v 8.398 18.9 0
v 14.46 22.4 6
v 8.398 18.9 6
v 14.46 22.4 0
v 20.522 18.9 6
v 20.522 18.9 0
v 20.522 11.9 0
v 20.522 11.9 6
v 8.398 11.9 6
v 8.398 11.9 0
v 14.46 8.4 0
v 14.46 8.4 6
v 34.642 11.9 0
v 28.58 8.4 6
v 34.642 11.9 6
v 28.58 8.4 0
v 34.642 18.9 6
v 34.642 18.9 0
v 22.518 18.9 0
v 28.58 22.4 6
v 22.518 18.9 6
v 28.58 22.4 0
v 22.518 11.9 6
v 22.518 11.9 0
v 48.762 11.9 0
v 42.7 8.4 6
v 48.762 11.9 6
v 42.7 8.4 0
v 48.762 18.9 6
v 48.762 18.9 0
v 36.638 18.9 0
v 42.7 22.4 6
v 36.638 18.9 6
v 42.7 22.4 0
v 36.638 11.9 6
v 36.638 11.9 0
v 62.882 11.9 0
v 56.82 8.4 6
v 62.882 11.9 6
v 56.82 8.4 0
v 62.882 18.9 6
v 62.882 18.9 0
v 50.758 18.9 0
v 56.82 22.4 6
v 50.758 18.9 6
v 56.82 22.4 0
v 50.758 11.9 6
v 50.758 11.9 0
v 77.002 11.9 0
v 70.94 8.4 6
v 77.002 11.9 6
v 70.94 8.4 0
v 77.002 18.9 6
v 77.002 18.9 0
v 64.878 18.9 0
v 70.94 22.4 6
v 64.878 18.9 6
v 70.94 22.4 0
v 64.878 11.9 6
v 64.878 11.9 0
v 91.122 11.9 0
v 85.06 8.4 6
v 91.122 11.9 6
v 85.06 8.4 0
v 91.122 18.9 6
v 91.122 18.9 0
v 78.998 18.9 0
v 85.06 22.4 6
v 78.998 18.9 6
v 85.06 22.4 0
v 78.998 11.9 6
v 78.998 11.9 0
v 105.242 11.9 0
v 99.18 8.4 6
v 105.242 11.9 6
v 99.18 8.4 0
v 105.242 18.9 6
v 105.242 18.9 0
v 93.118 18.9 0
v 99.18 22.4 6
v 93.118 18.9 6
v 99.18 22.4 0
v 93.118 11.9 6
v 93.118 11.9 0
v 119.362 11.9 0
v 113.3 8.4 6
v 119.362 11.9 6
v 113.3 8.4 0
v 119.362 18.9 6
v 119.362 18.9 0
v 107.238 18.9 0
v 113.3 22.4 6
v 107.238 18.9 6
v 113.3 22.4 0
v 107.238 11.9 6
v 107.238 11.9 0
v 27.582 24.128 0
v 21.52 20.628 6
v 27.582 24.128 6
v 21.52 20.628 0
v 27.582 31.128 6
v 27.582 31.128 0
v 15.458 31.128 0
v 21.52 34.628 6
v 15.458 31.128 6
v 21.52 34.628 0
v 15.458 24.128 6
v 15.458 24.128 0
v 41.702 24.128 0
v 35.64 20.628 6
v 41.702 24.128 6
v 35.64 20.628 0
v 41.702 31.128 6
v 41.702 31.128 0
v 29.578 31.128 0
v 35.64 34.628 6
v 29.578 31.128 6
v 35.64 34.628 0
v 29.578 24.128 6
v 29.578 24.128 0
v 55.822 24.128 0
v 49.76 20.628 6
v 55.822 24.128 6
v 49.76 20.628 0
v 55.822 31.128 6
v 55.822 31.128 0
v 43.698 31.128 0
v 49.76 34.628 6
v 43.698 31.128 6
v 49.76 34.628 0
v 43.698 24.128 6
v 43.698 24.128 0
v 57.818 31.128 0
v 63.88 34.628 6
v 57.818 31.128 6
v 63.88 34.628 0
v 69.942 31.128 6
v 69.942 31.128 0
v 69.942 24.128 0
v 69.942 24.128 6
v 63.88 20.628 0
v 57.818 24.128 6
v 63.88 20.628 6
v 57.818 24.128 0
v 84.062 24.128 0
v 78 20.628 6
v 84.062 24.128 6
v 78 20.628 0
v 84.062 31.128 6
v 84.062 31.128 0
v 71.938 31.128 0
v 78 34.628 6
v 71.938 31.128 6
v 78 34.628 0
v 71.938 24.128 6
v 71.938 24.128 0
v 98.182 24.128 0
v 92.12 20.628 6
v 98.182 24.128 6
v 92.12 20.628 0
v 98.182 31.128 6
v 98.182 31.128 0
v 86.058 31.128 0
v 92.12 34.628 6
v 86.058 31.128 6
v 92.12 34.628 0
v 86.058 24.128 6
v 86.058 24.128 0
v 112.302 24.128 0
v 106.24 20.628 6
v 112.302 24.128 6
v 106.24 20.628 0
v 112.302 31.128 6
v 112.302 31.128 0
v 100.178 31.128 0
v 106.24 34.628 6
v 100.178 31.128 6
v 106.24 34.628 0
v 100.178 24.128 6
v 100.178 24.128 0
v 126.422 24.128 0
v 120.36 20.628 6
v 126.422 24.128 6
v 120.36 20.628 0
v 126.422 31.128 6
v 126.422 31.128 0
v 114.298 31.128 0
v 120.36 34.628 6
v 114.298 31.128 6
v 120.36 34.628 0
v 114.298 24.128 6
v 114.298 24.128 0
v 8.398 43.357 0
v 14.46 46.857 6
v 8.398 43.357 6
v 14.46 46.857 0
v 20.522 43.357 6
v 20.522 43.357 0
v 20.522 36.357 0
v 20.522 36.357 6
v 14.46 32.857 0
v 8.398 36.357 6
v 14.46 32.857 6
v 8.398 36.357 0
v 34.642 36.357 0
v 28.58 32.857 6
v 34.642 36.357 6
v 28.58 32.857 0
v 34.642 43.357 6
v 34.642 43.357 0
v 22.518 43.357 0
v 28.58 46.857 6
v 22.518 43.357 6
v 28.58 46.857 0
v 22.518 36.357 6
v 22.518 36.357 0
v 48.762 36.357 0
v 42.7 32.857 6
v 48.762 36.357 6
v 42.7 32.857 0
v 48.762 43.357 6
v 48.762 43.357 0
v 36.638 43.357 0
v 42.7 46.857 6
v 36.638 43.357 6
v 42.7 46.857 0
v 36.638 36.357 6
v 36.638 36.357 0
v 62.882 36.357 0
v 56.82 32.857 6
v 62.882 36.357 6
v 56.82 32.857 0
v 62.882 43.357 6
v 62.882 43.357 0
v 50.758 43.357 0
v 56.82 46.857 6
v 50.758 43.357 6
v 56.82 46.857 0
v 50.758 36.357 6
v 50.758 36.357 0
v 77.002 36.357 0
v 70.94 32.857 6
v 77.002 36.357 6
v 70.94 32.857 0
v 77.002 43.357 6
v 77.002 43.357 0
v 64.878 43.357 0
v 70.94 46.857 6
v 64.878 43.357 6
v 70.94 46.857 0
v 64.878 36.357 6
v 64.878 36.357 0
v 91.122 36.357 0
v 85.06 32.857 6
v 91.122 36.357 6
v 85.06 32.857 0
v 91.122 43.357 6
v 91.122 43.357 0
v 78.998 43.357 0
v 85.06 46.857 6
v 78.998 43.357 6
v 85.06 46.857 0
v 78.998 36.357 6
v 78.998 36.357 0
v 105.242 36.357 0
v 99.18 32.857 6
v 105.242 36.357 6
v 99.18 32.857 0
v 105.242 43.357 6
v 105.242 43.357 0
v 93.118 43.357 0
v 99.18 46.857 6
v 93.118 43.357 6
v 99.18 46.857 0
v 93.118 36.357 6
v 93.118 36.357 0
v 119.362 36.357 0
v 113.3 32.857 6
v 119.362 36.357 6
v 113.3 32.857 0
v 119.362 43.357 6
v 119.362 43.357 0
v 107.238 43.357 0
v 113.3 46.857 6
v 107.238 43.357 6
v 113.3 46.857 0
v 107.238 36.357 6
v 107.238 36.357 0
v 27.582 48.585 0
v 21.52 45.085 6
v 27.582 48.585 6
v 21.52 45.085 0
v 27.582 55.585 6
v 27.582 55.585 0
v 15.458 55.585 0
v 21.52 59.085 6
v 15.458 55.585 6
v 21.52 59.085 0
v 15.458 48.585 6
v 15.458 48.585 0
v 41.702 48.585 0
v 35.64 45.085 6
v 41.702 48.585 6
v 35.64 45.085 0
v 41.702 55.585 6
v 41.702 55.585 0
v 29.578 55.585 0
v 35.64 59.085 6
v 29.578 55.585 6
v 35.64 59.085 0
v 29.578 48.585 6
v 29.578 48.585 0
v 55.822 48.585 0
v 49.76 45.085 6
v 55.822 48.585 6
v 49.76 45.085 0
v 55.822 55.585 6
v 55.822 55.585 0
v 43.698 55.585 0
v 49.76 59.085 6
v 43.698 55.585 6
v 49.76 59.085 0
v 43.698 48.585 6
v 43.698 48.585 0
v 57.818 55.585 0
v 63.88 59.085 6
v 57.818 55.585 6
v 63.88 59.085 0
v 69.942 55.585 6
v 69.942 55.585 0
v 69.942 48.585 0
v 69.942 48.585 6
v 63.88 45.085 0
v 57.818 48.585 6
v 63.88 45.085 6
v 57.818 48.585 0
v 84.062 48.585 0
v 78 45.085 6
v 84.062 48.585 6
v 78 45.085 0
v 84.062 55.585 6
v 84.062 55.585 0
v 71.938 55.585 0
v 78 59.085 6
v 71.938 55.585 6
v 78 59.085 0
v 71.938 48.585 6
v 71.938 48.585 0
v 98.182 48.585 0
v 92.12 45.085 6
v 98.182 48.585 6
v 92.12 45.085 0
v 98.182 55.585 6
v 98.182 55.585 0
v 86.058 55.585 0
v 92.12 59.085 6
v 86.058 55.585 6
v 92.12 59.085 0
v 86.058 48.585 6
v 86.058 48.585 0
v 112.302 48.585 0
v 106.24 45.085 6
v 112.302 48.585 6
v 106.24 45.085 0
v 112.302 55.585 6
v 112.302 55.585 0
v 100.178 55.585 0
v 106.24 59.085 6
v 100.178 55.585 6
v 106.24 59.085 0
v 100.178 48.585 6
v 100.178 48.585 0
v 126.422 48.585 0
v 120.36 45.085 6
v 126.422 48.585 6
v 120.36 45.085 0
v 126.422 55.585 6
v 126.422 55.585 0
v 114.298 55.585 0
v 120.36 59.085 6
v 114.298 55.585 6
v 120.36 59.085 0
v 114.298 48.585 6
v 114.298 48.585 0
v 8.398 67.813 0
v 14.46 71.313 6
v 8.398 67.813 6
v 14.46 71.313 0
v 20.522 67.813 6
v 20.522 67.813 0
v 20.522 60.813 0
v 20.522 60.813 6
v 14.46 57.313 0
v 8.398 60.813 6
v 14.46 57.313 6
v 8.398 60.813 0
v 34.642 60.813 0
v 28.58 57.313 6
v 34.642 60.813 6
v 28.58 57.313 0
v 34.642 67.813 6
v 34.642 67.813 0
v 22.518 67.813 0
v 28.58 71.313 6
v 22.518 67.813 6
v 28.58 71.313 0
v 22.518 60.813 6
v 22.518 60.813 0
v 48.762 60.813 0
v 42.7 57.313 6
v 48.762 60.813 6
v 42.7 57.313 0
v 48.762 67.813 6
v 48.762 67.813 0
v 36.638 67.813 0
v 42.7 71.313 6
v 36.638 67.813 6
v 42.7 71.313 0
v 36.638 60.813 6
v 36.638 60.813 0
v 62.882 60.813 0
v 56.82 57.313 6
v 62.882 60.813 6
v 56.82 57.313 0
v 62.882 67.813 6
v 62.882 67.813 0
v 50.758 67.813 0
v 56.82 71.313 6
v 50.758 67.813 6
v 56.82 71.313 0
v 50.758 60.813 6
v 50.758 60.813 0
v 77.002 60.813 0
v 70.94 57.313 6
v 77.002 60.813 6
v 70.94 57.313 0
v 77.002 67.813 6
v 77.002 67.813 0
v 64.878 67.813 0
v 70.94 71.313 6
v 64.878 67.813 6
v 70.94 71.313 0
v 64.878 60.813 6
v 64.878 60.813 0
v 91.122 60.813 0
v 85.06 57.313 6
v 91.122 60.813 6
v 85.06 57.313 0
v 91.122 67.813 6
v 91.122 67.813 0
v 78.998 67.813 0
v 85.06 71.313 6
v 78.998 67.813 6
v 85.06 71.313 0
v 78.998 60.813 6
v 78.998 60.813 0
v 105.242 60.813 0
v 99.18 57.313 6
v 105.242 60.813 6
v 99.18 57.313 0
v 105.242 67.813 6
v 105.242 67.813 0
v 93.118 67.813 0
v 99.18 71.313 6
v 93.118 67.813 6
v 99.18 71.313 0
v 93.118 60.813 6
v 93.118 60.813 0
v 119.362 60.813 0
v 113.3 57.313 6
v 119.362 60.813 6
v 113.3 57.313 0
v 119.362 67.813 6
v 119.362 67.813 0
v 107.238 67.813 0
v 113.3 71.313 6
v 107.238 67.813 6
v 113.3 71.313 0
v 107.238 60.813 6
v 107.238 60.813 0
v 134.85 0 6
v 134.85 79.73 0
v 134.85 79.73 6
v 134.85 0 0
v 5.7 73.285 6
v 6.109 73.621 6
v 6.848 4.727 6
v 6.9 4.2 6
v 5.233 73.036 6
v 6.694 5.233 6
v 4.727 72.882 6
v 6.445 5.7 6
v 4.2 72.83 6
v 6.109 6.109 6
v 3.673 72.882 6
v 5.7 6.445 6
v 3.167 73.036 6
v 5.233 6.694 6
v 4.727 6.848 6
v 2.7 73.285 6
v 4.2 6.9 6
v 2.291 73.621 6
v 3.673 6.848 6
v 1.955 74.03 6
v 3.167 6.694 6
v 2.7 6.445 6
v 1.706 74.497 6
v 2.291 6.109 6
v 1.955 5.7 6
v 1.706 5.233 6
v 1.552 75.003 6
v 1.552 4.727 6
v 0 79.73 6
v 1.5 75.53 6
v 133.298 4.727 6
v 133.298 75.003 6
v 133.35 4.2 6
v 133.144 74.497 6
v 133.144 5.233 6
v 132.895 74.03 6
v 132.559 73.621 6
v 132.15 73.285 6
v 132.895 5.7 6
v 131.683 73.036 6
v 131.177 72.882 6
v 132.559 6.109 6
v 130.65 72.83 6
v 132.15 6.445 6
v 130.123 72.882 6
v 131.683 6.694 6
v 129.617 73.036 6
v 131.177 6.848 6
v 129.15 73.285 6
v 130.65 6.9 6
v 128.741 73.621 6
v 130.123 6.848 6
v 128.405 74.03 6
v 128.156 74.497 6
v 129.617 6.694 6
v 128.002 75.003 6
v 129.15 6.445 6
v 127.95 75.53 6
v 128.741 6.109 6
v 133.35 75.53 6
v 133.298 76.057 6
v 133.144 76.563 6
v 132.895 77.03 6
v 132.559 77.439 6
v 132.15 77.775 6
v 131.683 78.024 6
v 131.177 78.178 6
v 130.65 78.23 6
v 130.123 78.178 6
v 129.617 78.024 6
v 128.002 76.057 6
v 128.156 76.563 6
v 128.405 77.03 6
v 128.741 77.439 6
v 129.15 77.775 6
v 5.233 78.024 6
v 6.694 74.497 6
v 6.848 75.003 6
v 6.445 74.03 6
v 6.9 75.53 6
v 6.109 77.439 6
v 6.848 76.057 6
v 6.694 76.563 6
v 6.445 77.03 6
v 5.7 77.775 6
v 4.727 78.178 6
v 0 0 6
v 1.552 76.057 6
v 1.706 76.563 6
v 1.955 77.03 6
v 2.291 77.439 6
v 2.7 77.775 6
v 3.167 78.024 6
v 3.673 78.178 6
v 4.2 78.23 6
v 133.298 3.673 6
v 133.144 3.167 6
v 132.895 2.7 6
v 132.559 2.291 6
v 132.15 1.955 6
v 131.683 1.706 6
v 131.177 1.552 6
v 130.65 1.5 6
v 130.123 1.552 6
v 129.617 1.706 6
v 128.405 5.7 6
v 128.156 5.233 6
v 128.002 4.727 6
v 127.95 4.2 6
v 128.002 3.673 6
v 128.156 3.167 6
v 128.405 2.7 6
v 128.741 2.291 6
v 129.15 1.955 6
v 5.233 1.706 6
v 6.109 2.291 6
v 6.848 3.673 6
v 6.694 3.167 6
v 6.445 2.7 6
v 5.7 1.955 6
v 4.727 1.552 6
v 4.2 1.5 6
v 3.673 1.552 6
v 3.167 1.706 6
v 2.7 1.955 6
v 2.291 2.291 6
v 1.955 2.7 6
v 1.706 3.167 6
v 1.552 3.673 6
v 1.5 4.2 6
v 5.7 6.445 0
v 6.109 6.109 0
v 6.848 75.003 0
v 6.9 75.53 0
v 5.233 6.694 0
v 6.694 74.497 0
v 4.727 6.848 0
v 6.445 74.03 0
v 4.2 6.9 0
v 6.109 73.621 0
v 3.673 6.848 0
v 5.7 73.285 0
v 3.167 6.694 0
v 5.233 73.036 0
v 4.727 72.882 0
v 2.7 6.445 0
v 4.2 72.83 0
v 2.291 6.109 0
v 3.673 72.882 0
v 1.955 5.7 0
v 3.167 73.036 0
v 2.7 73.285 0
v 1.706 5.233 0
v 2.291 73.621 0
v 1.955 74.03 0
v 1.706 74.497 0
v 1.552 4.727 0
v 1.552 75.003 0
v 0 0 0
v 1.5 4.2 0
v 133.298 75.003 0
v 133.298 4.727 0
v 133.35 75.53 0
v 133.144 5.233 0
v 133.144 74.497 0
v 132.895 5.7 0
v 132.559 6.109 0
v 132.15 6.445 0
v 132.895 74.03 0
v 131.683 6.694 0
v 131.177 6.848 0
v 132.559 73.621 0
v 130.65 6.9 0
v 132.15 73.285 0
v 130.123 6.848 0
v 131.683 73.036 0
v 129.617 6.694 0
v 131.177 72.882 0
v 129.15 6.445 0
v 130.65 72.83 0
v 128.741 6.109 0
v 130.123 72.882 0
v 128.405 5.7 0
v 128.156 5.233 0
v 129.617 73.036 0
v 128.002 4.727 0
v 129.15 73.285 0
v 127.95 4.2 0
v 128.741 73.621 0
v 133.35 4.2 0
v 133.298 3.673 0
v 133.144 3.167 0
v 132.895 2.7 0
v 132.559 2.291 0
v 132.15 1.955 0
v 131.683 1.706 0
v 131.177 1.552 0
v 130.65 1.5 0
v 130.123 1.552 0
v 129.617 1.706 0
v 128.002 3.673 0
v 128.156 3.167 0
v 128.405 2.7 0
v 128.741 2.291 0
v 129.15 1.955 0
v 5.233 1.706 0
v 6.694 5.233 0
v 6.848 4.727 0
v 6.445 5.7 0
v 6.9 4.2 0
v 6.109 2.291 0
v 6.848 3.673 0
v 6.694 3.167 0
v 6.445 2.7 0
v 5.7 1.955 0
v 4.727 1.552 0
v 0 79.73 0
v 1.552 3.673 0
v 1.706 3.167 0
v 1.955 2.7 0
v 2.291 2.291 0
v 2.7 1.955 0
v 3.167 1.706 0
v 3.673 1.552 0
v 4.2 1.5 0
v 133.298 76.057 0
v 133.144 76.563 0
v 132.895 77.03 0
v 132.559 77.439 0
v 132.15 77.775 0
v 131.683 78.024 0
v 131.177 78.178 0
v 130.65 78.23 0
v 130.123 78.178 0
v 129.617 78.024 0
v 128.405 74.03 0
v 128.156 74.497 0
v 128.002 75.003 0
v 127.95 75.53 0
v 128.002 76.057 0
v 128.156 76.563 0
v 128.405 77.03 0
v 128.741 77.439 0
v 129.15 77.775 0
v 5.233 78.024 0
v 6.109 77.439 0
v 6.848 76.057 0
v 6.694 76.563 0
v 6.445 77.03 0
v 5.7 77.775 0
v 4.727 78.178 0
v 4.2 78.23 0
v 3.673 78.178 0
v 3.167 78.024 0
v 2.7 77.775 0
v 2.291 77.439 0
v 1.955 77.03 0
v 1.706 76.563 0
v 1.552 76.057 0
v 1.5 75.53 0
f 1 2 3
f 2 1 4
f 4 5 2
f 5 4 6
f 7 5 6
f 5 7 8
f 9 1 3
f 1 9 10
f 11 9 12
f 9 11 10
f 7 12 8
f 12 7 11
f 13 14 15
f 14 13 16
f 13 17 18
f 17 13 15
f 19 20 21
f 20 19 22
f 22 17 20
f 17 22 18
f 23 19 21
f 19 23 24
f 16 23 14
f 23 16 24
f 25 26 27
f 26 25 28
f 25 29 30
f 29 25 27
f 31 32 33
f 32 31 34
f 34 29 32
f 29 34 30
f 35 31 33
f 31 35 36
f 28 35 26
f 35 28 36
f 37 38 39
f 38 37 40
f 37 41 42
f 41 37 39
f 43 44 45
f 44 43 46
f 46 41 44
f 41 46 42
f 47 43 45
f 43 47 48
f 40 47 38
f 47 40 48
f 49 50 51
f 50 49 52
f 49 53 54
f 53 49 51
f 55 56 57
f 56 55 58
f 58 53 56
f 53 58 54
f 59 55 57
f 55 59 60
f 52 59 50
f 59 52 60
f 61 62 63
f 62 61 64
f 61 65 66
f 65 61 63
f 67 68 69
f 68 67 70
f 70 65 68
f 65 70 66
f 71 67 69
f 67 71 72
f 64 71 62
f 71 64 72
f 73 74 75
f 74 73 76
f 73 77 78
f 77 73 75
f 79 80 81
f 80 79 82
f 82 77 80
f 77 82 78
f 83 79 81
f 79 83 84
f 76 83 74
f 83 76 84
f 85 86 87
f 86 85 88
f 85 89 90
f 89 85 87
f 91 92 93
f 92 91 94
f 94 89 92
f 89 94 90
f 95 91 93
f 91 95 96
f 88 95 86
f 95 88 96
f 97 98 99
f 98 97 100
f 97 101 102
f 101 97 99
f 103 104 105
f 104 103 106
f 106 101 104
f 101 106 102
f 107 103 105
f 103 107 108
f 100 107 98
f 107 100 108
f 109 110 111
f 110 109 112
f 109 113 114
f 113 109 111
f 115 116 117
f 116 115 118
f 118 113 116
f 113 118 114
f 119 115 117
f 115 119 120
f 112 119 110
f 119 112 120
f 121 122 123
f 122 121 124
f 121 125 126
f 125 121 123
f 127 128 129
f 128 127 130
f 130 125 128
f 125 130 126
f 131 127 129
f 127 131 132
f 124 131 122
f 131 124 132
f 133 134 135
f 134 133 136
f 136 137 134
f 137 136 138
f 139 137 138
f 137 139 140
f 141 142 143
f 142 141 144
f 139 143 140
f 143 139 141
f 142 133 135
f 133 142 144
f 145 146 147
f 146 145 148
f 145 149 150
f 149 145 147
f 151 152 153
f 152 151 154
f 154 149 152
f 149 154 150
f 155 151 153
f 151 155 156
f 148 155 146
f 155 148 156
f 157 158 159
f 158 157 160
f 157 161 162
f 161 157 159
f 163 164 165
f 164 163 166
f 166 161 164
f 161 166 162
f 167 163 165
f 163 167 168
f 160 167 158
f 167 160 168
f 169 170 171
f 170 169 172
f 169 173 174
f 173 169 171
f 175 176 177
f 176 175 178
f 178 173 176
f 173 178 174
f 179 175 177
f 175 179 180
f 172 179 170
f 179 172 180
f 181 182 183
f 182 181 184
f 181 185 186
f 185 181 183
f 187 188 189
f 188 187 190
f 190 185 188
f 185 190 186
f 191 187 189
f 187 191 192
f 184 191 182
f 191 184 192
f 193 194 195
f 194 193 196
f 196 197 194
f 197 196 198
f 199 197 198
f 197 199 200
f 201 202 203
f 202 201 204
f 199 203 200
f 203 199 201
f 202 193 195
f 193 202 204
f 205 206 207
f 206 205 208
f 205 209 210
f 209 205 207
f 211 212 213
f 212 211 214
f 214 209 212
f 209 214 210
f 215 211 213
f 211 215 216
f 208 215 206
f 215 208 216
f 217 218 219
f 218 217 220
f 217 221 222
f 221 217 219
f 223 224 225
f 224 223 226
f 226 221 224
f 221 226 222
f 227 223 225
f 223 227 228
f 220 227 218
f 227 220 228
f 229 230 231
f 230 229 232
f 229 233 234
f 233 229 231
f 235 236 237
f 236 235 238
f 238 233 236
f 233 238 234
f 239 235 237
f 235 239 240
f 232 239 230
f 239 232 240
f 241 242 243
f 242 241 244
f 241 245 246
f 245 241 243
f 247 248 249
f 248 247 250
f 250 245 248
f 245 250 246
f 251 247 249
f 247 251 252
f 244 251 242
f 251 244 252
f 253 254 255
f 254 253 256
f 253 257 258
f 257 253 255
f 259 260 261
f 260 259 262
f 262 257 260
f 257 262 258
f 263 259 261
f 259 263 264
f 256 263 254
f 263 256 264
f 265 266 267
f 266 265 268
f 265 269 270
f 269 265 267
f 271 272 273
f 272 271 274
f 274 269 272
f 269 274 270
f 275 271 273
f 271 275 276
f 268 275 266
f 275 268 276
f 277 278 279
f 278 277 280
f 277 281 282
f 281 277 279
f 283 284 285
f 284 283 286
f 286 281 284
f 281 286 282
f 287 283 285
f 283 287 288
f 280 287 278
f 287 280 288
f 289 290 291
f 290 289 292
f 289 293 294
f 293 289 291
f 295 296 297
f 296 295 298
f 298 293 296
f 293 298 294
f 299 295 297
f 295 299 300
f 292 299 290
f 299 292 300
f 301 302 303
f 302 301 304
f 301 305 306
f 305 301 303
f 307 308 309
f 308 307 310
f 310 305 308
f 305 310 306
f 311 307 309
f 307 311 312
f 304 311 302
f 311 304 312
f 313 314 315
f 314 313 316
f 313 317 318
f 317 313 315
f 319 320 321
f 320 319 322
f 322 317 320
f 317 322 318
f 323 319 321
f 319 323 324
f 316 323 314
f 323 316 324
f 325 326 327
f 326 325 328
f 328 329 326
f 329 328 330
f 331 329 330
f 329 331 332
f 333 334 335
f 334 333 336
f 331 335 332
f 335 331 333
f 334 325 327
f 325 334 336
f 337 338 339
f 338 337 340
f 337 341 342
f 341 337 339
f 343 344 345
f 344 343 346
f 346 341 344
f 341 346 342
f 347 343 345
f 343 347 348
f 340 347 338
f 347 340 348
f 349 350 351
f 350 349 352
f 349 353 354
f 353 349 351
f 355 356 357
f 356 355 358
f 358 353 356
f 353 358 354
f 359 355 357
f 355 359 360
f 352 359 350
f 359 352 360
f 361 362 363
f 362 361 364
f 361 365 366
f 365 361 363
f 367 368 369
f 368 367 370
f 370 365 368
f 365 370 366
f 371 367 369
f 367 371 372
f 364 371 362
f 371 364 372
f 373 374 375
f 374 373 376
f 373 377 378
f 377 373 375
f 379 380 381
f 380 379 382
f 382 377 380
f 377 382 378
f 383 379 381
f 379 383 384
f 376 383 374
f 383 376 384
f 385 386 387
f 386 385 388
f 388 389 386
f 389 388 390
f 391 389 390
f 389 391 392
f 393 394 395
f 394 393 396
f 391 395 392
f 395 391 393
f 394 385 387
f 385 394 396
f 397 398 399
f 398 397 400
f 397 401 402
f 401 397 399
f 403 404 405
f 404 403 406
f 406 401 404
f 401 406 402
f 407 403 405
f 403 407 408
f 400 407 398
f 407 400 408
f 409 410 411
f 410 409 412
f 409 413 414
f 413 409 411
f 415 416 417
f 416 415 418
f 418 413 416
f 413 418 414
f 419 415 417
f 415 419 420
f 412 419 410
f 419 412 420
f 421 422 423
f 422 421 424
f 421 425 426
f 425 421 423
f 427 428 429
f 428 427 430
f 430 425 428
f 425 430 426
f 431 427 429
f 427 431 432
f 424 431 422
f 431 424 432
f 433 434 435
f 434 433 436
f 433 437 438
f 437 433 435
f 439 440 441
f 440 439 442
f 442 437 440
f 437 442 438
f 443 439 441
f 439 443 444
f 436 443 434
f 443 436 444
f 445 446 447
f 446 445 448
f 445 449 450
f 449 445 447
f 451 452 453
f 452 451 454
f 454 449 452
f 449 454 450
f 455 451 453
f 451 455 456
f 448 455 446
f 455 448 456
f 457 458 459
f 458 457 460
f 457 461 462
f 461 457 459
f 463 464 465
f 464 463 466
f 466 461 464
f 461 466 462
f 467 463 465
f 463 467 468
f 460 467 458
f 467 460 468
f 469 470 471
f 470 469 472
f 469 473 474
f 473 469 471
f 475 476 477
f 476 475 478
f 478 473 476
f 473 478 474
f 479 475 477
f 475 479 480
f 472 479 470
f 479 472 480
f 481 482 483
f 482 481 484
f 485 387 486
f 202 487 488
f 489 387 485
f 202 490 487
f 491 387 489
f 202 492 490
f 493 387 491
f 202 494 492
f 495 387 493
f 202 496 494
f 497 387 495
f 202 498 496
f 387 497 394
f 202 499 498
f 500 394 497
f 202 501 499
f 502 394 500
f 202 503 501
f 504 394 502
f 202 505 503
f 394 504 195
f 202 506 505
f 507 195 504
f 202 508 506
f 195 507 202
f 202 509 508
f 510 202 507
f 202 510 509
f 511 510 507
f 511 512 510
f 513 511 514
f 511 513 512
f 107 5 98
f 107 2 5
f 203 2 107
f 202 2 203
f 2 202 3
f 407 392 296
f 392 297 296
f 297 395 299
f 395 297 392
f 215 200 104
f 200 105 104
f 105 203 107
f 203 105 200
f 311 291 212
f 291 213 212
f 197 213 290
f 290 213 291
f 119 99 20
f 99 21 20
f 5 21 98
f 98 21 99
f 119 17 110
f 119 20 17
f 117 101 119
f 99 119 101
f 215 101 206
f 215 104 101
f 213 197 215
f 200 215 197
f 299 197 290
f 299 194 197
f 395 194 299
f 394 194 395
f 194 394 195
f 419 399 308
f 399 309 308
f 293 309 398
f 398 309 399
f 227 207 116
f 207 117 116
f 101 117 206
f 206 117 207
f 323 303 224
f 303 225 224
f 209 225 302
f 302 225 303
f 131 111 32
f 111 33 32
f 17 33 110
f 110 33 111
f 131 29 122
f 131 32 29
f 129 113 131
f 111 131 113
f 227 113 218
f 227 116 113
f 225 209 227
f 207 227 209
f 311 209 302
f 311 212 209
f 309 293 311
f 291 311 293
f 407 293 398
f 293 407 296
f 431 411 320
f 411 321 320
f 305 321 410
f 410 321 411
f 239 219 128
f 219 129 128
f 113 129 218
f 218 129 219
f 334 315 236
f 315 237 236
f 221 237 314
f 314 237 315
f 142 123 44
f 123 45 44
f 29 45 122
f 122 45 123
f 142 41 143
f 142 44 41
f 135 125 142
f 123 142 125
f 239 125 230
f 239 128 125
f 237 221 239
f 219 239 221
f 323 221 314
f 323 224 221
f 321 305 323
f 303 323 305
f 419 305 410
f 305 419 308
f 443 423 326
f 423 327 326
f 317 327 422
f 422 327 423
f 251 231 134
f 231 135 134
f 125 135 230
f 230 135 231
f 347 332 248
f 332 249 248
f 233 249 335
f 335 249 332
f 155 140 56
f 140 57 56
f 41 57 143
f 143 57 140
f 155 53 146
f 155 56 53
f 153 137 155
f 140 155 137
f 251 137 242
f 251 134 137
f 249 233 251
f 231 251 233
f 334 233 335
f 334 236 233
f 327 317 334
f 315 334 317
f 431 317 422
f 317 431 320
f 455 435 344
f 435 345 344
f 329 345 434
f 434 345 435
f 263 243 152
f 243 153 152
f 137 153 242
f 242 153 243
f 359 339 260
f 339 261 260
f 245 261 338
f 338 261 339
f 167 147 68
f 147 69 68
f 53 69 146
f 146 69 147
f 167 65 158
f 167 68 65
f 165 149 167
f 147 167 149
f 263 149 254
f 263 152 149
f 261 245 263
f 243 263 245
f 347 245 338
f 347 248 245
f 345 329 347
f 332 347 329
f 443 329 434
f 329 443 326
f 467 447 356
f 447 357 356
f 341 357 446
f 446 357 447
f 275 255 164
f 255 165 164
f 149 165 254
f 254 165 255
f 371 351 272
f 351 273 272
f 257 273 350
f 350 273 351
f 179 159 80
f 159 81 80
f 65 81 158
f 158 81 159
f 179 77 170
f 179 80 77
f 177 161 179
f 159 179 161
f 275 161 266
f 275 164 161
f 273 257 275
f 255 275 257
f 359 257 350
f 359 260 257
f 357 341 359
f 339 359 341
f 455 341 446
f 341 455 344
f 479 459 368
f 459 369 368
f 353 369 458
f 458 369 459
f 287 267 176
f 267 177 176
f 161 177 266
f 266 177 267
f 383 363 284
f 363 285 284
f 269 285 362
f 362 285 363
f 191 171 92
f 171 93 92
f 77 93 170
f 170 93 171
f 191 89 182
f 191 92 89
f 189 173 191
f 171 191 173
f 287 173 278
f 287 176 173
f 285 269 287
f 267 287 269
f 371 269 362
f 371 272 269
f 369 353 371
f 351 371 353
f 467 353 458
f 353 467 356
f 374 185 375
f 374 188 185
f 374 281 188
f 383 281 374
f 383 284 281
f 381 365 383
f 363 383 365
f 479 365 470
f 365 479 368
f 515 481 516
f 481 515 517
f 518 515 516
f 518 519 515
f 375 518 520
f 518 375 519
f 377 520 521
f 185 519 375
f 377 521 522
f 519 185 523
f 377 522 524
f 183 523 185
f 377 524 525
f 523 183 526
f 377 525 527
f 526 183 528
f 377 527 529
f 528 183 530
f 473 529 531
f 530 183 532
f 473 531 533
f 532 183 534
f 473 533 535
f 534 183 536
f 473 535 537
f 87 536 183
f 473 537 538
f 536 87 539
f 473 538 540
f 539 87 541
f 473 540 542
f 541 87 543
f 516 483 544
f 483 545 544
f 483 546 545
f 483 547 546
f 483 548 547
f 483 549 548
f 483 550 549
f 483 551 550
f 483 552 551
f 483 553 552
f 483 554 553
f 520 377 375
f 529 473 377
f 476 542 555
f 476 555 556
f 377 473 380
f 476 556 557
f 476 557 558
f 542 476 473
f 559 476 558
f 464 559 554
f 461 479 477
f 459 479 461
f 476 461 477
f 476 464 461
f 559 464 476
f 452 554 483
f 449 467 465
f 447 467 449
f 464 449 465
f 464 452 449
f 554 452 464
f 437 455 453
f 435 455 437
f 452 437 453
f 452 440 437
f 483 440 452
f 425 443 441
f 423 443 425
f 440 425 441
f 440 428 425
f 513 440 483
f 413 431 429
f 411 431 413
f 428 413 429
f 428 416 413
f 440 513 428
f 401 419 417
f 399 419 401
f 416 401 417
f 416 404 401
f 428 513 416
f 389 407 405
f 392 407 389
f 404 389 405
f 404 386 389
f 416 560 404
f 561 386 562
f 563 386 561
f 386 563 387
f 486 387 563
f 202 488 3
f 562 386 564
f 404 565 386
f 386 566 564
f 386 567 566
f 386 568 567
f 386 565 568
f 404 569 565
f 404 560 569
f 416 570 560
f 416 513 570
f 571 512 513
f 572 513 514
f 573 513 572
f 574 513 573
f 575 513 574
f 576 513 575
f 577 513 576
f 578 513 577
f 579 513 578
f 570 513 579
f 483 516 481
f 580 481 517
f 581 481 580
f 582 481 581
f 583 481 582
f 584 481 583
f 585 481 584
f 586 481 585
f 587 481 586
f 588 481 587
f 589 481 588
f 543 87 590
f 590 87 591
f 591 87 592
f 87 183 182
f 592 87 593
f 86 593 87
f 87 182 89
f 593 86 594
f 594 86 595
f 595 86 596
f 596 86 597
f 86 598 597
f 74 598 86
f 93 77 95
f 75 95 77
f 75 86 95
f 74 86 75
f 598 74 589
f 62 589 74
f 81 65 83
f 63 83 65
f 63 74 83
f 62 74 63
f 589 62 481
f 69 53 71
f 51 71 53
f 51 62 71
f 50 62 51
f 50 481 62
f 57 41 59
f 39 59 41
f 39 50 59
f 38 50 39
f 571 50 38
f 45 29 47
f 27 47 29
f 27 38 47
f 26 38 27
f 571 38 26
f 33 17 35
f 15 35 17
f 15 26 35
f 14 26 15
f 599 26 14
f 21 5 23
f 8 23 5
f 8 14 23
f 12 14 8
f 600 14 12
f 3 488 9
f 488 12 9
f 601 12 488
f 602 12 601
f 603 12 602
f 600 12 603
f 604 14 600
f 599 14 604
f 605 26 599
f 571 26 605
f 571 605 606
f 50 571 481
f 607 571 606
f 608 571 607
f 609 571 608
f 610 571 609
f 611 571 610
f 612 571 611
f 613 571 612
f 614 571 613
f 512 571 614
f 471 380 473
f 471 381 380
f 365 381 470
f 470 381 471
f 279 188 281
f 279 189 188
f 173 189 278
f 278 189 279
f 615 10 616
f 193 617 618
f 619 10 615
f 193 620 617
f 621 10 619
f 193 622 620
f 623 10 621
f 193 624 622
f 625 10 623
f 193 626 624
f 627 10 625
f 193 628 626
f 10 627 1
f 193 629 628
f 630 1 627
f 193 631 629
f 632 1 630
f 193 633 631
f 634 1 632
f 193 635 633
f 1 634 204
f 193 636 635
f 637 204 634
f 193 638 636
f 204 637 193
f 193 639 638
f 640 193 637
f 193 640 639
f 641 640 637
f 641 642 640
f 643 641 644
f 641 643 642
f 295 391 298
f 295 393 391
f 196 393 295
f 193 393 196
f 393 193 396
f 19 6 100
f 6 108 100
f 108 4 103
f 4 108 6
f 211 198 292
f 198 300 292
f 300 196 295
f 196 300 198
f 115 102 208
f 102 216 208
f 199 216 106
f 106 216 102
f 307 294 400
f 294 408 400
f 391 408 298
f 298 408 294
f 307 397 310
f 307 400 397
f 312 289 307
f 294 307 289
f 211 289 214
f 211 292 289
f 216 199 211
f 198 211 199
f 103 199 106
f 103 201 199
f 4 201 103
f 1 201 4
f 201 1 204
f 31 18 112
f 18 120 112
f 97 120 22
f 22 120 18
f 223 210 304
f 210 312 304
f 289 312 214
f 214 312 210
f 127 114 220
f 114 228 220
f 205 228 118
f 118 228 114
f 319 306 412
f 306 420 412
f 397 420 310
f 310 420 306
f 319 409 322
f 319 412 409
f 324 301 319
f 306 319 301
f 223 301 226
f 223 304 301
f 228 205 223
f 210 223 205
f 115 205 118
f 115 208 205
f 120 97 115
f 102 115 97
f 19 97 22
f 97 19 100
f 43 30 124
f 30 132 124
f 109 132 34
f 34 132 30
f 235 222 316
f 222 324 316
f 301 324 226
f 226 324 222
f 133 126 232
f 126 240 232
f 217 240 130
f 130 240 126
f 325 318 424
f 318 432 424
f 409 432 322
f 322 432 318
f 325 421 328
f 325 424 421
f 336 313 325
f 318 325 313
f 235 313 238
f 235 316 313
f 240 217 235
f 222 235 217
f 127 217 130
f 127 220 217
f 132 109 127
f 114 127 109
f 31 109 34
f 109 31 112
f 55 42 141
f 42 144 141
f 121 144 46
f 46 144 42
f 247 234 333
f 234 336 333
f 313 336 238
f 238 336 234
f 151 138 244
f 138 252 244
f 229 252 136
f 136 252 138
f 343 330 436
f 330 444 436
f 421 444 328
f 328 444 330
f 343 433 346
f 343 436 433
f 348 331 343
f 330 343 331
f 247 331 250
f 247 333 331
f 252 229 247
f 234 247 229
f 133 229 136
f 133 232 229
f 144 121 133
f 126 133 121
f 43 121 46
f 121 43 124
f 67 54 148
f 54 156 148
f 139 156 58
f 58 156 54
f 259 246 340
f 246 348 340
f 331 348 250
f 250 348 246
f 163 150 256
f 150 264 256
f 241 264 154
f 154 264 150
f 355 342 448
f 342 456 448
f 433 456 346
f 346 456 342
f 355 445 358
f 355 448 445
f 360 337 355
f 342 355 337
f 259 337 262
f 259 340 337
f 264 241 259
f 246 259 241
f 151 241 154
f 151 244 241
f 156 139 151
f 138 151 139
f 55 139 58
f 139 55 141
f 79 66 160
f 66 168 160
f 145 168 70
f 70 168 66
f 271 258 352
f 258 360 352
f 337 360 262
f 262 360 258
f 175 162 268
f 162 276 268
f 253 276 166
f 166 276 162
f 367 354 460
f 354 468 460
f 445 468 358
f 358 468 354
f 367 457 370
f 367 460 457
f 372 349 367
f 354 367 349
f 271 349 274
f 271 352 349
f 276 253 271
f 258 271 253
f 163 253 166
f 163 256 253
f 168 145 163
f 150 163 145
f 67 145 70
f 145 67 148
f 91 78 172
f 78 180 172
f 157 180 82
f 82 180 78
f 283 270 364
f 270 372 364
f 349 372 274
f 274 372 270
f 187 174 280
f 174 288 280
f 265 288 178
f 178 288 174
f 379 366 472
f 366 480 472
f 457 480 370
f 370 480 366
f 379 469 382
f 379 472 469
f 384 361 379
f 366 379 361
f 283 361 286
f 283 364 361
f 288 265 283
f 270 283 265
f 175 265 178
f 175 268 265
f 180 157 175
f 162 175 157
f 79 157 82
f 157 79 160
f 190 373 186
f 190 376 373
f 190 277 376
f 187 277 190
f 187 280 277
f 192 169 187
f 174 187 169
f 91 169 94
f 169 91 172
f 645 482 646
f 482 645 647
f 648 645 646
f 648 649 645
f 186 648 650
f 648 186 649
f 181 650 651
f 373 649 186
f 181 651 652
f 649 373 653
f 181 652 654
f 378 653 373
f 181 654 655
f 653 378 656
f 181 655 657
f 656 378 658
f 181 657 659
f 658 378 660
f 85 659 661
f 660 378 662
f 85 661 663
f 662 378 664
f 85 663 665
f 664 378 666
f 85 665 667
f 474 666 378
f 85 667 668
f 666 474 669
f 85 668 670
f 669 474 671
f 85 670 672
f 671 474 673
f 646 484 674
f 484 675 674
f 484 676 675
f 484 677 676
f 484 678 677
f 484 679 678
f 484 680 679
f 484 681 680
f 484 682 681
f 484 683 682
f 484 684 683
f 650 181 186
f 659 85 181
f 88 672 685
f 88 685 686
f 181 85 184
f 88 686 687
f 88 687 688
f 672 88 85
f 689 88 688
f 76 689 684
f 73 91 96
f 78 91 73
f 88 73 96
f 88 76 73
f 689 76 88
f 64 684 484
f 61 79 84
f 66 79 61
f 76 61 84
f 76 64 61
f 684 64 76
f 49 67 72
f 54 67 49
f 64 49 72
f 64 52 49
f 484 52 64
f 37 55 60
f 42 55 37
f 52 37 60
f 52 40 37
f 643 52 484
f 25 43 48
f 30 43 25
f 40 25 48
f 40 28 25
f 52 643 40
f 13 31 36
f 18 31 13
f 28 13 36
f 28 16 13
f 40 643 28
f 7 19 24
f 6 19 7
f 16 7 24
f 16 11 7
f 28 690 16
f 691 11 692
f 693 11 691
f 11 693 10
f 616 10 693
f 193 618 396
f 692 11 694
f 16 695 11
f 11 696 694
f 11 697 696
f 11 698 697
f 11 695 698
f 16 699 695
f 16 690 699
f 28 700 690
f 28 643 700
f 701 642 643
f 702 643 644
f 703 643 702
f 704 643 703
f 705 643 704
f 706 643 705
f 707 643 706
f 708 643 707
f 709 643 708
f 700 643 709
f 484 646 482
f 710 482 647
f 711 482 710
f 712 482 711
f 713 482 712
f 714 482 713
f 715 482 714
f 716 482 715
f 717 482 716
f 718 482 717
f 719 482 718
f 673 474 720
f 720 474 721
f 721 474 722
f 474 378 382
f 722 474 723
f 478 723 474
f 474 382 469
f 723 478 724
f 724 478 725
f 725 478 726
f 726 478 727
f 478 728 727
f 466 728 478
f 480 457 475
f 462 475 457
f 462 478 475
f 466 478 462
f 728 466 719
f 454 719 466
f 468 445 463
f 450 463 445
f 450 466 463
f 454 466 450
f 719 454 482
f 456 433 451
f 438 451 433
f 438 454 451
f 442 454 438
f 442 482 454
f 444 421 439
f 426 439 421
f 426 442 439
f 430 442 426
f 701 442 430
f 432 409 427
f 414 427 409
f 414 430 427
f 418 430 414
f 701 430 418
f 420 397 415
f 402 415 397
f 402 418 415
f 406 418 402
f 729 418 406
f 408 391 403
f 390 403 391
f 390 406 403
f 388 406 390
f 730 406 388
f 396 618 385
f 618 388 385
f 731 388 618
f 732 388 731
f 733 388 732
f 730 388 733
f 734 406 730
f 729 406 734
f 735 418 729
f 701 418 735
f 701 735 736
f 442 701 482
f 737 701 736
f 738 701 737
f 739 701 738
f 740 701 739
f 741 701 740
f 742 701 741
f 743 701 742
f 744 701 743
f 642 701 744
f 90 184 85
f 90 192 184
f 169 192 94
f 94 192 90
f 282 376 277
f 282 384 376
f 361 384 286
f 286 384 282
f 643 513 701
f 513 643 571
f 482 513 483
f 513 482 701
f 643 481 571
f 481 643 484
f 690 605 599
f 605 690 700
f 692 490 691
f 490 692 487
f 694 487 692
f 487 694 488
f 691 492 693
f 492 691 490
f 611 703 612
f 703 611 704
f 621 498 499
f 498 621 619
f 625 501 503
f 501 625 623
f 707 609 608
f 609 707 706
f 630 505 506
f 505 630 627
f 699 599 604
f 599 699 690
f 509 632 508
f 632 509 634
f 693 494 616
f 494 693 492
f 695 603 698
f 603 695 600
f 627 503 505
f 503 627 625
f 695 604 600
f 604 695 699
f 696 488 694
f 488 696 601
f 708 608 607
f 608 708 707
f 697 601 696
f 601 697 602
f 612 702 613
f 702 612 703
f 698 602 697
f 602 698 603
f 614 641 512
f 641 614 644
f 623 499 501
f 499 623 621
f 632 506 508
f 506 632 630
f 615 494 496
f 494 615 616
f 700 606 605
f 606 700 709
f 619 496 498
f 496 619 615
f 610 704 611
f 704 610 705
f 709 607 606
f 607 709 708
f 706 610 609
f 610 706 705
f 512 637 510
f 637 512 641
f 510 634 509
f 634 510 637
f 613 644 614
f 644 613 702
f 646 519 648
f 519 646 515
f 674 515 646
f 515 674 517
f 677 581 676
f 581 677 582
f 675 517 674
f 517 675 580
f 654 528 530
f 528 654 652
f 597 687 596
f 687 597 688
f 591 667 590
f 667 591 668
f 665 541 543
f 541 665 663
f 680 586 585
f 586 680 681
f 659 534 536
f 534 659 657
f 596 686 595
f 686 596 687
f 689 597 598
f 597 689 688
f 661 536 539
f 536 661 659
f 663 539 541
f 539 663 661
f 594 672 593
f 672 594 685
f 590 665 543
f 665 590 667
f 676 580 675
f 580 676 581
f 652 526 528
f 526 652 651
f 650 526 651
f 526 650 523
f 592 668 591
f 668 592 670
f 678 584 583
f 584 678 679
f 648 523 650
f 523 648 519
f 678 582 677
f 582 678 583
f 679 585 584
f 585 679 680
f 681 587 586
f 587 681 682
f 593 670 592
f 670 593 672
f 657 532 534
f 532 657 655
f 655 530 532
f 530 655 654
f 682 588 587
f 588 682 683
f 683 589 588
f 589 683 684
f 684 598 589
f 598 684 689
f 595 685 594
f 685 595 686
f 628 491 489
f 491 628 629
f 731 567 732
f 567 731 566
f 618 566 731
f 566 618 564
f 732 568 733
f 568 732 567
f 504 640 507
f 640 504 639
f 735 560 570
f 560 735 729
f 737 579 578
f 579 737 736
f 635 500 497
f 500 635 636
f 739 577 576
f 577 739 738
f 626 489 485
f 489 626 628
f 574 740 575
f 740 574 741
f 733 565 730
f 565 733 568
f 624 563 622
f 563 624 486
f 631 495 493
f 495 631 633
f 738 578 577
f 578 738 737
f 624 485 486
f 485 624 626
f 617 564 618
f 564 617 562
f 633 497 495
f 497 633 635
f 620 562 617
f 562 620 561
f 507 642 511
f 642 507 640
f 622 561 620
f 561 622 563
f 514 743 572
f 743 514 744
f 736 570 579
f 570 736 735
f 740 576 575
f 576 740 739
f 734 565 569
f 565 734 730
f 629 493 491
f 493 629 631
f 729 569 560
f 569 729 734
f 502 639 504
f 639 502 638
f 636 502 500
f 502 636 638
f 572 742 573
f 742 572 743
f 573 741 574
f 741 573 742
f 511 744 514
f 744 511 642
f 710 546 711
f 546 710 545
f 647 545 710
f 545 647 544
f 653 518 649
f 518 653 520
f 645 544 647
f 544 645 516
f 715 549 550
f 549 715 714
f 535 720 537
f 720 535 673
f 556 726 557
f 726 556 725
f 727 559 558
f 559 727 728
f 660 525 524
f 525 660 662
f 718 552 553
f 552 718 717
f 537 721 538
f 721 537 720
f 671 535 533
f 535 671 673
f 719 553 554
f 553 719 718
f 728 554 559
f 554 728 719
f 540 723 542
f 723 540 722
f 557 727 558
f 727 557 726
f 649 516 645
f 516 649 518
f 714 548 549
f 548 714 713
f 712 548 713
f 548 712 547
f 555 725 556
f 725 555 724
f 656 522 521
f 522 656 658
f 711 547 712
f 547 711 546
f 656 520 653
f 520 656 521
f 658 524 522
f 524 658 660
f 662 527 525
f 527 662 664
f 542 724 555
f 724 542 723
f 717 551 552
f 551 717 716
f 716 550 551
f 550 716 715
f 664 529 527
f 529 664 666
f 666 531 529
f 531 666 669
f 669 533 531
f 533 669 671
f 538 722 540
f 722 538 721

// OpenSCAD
$fn = 32;

// ----------------------------------------------------------------------
// Honeycomb panel: 134.85 x 79.73 mm, 40 cells of 14 mm
// ----------------------------------------------------------------------

// --- parameters (mm) ---
panel_w = 134.85;         // panel width
panel_d = 79.73;          // panel depth
thick = 6;                // panel thickness
cell_r = 7;               // hex cell circumradius
pitch = 14.12;            // hex cell pitch (centre to centre)
web = 2;                  // web between the cells
columns = 8;              // columns of cells
rows = 5;                 // rows of cells
cell_count = 40;          // total cells
shift_x = 14.46;          // first cell offset in x
shift_y = 15.4;           // first cell offset in y
mount_d = 5.4;            // corner mounting holes
hole_off = 4.2;           // mounting hole offset from the corners

difference() {
  union() {
    cube([panel_w, panel_d, thick]);
  }
  /* hexagonal cells, point-up, cut right through the plate */
  for (row = [0 : rows - 1]) {
    for (col = [0 : columns - 1]) {
      translate([shift_x + col * pitch + (row % 2) * pitch / 2, shift_y + row * pitch * 0.866025, -2.5]) rotate([0, 0, 30]) cylinder(h = thick + 5, d = 2 * cell_r, $fn = 6);
    }
  }
  /* corner mounting holes, clear of the outer cell web */
  translate([4.2, 4.2, -2.5]) cylinder(h = thick + 5, d = mount_d);
  translate([130.65, 4.2, -2.5]) cylinder(h = thick + 5, d = mount_d);
  translate([4.2, 75.53, -2.5]) cylinder(h = thick + 5, d = mount_d);
  translate([130.65, 75.53, -2.5]) cylinder(h = thick + 5, d = mount_d);
}
